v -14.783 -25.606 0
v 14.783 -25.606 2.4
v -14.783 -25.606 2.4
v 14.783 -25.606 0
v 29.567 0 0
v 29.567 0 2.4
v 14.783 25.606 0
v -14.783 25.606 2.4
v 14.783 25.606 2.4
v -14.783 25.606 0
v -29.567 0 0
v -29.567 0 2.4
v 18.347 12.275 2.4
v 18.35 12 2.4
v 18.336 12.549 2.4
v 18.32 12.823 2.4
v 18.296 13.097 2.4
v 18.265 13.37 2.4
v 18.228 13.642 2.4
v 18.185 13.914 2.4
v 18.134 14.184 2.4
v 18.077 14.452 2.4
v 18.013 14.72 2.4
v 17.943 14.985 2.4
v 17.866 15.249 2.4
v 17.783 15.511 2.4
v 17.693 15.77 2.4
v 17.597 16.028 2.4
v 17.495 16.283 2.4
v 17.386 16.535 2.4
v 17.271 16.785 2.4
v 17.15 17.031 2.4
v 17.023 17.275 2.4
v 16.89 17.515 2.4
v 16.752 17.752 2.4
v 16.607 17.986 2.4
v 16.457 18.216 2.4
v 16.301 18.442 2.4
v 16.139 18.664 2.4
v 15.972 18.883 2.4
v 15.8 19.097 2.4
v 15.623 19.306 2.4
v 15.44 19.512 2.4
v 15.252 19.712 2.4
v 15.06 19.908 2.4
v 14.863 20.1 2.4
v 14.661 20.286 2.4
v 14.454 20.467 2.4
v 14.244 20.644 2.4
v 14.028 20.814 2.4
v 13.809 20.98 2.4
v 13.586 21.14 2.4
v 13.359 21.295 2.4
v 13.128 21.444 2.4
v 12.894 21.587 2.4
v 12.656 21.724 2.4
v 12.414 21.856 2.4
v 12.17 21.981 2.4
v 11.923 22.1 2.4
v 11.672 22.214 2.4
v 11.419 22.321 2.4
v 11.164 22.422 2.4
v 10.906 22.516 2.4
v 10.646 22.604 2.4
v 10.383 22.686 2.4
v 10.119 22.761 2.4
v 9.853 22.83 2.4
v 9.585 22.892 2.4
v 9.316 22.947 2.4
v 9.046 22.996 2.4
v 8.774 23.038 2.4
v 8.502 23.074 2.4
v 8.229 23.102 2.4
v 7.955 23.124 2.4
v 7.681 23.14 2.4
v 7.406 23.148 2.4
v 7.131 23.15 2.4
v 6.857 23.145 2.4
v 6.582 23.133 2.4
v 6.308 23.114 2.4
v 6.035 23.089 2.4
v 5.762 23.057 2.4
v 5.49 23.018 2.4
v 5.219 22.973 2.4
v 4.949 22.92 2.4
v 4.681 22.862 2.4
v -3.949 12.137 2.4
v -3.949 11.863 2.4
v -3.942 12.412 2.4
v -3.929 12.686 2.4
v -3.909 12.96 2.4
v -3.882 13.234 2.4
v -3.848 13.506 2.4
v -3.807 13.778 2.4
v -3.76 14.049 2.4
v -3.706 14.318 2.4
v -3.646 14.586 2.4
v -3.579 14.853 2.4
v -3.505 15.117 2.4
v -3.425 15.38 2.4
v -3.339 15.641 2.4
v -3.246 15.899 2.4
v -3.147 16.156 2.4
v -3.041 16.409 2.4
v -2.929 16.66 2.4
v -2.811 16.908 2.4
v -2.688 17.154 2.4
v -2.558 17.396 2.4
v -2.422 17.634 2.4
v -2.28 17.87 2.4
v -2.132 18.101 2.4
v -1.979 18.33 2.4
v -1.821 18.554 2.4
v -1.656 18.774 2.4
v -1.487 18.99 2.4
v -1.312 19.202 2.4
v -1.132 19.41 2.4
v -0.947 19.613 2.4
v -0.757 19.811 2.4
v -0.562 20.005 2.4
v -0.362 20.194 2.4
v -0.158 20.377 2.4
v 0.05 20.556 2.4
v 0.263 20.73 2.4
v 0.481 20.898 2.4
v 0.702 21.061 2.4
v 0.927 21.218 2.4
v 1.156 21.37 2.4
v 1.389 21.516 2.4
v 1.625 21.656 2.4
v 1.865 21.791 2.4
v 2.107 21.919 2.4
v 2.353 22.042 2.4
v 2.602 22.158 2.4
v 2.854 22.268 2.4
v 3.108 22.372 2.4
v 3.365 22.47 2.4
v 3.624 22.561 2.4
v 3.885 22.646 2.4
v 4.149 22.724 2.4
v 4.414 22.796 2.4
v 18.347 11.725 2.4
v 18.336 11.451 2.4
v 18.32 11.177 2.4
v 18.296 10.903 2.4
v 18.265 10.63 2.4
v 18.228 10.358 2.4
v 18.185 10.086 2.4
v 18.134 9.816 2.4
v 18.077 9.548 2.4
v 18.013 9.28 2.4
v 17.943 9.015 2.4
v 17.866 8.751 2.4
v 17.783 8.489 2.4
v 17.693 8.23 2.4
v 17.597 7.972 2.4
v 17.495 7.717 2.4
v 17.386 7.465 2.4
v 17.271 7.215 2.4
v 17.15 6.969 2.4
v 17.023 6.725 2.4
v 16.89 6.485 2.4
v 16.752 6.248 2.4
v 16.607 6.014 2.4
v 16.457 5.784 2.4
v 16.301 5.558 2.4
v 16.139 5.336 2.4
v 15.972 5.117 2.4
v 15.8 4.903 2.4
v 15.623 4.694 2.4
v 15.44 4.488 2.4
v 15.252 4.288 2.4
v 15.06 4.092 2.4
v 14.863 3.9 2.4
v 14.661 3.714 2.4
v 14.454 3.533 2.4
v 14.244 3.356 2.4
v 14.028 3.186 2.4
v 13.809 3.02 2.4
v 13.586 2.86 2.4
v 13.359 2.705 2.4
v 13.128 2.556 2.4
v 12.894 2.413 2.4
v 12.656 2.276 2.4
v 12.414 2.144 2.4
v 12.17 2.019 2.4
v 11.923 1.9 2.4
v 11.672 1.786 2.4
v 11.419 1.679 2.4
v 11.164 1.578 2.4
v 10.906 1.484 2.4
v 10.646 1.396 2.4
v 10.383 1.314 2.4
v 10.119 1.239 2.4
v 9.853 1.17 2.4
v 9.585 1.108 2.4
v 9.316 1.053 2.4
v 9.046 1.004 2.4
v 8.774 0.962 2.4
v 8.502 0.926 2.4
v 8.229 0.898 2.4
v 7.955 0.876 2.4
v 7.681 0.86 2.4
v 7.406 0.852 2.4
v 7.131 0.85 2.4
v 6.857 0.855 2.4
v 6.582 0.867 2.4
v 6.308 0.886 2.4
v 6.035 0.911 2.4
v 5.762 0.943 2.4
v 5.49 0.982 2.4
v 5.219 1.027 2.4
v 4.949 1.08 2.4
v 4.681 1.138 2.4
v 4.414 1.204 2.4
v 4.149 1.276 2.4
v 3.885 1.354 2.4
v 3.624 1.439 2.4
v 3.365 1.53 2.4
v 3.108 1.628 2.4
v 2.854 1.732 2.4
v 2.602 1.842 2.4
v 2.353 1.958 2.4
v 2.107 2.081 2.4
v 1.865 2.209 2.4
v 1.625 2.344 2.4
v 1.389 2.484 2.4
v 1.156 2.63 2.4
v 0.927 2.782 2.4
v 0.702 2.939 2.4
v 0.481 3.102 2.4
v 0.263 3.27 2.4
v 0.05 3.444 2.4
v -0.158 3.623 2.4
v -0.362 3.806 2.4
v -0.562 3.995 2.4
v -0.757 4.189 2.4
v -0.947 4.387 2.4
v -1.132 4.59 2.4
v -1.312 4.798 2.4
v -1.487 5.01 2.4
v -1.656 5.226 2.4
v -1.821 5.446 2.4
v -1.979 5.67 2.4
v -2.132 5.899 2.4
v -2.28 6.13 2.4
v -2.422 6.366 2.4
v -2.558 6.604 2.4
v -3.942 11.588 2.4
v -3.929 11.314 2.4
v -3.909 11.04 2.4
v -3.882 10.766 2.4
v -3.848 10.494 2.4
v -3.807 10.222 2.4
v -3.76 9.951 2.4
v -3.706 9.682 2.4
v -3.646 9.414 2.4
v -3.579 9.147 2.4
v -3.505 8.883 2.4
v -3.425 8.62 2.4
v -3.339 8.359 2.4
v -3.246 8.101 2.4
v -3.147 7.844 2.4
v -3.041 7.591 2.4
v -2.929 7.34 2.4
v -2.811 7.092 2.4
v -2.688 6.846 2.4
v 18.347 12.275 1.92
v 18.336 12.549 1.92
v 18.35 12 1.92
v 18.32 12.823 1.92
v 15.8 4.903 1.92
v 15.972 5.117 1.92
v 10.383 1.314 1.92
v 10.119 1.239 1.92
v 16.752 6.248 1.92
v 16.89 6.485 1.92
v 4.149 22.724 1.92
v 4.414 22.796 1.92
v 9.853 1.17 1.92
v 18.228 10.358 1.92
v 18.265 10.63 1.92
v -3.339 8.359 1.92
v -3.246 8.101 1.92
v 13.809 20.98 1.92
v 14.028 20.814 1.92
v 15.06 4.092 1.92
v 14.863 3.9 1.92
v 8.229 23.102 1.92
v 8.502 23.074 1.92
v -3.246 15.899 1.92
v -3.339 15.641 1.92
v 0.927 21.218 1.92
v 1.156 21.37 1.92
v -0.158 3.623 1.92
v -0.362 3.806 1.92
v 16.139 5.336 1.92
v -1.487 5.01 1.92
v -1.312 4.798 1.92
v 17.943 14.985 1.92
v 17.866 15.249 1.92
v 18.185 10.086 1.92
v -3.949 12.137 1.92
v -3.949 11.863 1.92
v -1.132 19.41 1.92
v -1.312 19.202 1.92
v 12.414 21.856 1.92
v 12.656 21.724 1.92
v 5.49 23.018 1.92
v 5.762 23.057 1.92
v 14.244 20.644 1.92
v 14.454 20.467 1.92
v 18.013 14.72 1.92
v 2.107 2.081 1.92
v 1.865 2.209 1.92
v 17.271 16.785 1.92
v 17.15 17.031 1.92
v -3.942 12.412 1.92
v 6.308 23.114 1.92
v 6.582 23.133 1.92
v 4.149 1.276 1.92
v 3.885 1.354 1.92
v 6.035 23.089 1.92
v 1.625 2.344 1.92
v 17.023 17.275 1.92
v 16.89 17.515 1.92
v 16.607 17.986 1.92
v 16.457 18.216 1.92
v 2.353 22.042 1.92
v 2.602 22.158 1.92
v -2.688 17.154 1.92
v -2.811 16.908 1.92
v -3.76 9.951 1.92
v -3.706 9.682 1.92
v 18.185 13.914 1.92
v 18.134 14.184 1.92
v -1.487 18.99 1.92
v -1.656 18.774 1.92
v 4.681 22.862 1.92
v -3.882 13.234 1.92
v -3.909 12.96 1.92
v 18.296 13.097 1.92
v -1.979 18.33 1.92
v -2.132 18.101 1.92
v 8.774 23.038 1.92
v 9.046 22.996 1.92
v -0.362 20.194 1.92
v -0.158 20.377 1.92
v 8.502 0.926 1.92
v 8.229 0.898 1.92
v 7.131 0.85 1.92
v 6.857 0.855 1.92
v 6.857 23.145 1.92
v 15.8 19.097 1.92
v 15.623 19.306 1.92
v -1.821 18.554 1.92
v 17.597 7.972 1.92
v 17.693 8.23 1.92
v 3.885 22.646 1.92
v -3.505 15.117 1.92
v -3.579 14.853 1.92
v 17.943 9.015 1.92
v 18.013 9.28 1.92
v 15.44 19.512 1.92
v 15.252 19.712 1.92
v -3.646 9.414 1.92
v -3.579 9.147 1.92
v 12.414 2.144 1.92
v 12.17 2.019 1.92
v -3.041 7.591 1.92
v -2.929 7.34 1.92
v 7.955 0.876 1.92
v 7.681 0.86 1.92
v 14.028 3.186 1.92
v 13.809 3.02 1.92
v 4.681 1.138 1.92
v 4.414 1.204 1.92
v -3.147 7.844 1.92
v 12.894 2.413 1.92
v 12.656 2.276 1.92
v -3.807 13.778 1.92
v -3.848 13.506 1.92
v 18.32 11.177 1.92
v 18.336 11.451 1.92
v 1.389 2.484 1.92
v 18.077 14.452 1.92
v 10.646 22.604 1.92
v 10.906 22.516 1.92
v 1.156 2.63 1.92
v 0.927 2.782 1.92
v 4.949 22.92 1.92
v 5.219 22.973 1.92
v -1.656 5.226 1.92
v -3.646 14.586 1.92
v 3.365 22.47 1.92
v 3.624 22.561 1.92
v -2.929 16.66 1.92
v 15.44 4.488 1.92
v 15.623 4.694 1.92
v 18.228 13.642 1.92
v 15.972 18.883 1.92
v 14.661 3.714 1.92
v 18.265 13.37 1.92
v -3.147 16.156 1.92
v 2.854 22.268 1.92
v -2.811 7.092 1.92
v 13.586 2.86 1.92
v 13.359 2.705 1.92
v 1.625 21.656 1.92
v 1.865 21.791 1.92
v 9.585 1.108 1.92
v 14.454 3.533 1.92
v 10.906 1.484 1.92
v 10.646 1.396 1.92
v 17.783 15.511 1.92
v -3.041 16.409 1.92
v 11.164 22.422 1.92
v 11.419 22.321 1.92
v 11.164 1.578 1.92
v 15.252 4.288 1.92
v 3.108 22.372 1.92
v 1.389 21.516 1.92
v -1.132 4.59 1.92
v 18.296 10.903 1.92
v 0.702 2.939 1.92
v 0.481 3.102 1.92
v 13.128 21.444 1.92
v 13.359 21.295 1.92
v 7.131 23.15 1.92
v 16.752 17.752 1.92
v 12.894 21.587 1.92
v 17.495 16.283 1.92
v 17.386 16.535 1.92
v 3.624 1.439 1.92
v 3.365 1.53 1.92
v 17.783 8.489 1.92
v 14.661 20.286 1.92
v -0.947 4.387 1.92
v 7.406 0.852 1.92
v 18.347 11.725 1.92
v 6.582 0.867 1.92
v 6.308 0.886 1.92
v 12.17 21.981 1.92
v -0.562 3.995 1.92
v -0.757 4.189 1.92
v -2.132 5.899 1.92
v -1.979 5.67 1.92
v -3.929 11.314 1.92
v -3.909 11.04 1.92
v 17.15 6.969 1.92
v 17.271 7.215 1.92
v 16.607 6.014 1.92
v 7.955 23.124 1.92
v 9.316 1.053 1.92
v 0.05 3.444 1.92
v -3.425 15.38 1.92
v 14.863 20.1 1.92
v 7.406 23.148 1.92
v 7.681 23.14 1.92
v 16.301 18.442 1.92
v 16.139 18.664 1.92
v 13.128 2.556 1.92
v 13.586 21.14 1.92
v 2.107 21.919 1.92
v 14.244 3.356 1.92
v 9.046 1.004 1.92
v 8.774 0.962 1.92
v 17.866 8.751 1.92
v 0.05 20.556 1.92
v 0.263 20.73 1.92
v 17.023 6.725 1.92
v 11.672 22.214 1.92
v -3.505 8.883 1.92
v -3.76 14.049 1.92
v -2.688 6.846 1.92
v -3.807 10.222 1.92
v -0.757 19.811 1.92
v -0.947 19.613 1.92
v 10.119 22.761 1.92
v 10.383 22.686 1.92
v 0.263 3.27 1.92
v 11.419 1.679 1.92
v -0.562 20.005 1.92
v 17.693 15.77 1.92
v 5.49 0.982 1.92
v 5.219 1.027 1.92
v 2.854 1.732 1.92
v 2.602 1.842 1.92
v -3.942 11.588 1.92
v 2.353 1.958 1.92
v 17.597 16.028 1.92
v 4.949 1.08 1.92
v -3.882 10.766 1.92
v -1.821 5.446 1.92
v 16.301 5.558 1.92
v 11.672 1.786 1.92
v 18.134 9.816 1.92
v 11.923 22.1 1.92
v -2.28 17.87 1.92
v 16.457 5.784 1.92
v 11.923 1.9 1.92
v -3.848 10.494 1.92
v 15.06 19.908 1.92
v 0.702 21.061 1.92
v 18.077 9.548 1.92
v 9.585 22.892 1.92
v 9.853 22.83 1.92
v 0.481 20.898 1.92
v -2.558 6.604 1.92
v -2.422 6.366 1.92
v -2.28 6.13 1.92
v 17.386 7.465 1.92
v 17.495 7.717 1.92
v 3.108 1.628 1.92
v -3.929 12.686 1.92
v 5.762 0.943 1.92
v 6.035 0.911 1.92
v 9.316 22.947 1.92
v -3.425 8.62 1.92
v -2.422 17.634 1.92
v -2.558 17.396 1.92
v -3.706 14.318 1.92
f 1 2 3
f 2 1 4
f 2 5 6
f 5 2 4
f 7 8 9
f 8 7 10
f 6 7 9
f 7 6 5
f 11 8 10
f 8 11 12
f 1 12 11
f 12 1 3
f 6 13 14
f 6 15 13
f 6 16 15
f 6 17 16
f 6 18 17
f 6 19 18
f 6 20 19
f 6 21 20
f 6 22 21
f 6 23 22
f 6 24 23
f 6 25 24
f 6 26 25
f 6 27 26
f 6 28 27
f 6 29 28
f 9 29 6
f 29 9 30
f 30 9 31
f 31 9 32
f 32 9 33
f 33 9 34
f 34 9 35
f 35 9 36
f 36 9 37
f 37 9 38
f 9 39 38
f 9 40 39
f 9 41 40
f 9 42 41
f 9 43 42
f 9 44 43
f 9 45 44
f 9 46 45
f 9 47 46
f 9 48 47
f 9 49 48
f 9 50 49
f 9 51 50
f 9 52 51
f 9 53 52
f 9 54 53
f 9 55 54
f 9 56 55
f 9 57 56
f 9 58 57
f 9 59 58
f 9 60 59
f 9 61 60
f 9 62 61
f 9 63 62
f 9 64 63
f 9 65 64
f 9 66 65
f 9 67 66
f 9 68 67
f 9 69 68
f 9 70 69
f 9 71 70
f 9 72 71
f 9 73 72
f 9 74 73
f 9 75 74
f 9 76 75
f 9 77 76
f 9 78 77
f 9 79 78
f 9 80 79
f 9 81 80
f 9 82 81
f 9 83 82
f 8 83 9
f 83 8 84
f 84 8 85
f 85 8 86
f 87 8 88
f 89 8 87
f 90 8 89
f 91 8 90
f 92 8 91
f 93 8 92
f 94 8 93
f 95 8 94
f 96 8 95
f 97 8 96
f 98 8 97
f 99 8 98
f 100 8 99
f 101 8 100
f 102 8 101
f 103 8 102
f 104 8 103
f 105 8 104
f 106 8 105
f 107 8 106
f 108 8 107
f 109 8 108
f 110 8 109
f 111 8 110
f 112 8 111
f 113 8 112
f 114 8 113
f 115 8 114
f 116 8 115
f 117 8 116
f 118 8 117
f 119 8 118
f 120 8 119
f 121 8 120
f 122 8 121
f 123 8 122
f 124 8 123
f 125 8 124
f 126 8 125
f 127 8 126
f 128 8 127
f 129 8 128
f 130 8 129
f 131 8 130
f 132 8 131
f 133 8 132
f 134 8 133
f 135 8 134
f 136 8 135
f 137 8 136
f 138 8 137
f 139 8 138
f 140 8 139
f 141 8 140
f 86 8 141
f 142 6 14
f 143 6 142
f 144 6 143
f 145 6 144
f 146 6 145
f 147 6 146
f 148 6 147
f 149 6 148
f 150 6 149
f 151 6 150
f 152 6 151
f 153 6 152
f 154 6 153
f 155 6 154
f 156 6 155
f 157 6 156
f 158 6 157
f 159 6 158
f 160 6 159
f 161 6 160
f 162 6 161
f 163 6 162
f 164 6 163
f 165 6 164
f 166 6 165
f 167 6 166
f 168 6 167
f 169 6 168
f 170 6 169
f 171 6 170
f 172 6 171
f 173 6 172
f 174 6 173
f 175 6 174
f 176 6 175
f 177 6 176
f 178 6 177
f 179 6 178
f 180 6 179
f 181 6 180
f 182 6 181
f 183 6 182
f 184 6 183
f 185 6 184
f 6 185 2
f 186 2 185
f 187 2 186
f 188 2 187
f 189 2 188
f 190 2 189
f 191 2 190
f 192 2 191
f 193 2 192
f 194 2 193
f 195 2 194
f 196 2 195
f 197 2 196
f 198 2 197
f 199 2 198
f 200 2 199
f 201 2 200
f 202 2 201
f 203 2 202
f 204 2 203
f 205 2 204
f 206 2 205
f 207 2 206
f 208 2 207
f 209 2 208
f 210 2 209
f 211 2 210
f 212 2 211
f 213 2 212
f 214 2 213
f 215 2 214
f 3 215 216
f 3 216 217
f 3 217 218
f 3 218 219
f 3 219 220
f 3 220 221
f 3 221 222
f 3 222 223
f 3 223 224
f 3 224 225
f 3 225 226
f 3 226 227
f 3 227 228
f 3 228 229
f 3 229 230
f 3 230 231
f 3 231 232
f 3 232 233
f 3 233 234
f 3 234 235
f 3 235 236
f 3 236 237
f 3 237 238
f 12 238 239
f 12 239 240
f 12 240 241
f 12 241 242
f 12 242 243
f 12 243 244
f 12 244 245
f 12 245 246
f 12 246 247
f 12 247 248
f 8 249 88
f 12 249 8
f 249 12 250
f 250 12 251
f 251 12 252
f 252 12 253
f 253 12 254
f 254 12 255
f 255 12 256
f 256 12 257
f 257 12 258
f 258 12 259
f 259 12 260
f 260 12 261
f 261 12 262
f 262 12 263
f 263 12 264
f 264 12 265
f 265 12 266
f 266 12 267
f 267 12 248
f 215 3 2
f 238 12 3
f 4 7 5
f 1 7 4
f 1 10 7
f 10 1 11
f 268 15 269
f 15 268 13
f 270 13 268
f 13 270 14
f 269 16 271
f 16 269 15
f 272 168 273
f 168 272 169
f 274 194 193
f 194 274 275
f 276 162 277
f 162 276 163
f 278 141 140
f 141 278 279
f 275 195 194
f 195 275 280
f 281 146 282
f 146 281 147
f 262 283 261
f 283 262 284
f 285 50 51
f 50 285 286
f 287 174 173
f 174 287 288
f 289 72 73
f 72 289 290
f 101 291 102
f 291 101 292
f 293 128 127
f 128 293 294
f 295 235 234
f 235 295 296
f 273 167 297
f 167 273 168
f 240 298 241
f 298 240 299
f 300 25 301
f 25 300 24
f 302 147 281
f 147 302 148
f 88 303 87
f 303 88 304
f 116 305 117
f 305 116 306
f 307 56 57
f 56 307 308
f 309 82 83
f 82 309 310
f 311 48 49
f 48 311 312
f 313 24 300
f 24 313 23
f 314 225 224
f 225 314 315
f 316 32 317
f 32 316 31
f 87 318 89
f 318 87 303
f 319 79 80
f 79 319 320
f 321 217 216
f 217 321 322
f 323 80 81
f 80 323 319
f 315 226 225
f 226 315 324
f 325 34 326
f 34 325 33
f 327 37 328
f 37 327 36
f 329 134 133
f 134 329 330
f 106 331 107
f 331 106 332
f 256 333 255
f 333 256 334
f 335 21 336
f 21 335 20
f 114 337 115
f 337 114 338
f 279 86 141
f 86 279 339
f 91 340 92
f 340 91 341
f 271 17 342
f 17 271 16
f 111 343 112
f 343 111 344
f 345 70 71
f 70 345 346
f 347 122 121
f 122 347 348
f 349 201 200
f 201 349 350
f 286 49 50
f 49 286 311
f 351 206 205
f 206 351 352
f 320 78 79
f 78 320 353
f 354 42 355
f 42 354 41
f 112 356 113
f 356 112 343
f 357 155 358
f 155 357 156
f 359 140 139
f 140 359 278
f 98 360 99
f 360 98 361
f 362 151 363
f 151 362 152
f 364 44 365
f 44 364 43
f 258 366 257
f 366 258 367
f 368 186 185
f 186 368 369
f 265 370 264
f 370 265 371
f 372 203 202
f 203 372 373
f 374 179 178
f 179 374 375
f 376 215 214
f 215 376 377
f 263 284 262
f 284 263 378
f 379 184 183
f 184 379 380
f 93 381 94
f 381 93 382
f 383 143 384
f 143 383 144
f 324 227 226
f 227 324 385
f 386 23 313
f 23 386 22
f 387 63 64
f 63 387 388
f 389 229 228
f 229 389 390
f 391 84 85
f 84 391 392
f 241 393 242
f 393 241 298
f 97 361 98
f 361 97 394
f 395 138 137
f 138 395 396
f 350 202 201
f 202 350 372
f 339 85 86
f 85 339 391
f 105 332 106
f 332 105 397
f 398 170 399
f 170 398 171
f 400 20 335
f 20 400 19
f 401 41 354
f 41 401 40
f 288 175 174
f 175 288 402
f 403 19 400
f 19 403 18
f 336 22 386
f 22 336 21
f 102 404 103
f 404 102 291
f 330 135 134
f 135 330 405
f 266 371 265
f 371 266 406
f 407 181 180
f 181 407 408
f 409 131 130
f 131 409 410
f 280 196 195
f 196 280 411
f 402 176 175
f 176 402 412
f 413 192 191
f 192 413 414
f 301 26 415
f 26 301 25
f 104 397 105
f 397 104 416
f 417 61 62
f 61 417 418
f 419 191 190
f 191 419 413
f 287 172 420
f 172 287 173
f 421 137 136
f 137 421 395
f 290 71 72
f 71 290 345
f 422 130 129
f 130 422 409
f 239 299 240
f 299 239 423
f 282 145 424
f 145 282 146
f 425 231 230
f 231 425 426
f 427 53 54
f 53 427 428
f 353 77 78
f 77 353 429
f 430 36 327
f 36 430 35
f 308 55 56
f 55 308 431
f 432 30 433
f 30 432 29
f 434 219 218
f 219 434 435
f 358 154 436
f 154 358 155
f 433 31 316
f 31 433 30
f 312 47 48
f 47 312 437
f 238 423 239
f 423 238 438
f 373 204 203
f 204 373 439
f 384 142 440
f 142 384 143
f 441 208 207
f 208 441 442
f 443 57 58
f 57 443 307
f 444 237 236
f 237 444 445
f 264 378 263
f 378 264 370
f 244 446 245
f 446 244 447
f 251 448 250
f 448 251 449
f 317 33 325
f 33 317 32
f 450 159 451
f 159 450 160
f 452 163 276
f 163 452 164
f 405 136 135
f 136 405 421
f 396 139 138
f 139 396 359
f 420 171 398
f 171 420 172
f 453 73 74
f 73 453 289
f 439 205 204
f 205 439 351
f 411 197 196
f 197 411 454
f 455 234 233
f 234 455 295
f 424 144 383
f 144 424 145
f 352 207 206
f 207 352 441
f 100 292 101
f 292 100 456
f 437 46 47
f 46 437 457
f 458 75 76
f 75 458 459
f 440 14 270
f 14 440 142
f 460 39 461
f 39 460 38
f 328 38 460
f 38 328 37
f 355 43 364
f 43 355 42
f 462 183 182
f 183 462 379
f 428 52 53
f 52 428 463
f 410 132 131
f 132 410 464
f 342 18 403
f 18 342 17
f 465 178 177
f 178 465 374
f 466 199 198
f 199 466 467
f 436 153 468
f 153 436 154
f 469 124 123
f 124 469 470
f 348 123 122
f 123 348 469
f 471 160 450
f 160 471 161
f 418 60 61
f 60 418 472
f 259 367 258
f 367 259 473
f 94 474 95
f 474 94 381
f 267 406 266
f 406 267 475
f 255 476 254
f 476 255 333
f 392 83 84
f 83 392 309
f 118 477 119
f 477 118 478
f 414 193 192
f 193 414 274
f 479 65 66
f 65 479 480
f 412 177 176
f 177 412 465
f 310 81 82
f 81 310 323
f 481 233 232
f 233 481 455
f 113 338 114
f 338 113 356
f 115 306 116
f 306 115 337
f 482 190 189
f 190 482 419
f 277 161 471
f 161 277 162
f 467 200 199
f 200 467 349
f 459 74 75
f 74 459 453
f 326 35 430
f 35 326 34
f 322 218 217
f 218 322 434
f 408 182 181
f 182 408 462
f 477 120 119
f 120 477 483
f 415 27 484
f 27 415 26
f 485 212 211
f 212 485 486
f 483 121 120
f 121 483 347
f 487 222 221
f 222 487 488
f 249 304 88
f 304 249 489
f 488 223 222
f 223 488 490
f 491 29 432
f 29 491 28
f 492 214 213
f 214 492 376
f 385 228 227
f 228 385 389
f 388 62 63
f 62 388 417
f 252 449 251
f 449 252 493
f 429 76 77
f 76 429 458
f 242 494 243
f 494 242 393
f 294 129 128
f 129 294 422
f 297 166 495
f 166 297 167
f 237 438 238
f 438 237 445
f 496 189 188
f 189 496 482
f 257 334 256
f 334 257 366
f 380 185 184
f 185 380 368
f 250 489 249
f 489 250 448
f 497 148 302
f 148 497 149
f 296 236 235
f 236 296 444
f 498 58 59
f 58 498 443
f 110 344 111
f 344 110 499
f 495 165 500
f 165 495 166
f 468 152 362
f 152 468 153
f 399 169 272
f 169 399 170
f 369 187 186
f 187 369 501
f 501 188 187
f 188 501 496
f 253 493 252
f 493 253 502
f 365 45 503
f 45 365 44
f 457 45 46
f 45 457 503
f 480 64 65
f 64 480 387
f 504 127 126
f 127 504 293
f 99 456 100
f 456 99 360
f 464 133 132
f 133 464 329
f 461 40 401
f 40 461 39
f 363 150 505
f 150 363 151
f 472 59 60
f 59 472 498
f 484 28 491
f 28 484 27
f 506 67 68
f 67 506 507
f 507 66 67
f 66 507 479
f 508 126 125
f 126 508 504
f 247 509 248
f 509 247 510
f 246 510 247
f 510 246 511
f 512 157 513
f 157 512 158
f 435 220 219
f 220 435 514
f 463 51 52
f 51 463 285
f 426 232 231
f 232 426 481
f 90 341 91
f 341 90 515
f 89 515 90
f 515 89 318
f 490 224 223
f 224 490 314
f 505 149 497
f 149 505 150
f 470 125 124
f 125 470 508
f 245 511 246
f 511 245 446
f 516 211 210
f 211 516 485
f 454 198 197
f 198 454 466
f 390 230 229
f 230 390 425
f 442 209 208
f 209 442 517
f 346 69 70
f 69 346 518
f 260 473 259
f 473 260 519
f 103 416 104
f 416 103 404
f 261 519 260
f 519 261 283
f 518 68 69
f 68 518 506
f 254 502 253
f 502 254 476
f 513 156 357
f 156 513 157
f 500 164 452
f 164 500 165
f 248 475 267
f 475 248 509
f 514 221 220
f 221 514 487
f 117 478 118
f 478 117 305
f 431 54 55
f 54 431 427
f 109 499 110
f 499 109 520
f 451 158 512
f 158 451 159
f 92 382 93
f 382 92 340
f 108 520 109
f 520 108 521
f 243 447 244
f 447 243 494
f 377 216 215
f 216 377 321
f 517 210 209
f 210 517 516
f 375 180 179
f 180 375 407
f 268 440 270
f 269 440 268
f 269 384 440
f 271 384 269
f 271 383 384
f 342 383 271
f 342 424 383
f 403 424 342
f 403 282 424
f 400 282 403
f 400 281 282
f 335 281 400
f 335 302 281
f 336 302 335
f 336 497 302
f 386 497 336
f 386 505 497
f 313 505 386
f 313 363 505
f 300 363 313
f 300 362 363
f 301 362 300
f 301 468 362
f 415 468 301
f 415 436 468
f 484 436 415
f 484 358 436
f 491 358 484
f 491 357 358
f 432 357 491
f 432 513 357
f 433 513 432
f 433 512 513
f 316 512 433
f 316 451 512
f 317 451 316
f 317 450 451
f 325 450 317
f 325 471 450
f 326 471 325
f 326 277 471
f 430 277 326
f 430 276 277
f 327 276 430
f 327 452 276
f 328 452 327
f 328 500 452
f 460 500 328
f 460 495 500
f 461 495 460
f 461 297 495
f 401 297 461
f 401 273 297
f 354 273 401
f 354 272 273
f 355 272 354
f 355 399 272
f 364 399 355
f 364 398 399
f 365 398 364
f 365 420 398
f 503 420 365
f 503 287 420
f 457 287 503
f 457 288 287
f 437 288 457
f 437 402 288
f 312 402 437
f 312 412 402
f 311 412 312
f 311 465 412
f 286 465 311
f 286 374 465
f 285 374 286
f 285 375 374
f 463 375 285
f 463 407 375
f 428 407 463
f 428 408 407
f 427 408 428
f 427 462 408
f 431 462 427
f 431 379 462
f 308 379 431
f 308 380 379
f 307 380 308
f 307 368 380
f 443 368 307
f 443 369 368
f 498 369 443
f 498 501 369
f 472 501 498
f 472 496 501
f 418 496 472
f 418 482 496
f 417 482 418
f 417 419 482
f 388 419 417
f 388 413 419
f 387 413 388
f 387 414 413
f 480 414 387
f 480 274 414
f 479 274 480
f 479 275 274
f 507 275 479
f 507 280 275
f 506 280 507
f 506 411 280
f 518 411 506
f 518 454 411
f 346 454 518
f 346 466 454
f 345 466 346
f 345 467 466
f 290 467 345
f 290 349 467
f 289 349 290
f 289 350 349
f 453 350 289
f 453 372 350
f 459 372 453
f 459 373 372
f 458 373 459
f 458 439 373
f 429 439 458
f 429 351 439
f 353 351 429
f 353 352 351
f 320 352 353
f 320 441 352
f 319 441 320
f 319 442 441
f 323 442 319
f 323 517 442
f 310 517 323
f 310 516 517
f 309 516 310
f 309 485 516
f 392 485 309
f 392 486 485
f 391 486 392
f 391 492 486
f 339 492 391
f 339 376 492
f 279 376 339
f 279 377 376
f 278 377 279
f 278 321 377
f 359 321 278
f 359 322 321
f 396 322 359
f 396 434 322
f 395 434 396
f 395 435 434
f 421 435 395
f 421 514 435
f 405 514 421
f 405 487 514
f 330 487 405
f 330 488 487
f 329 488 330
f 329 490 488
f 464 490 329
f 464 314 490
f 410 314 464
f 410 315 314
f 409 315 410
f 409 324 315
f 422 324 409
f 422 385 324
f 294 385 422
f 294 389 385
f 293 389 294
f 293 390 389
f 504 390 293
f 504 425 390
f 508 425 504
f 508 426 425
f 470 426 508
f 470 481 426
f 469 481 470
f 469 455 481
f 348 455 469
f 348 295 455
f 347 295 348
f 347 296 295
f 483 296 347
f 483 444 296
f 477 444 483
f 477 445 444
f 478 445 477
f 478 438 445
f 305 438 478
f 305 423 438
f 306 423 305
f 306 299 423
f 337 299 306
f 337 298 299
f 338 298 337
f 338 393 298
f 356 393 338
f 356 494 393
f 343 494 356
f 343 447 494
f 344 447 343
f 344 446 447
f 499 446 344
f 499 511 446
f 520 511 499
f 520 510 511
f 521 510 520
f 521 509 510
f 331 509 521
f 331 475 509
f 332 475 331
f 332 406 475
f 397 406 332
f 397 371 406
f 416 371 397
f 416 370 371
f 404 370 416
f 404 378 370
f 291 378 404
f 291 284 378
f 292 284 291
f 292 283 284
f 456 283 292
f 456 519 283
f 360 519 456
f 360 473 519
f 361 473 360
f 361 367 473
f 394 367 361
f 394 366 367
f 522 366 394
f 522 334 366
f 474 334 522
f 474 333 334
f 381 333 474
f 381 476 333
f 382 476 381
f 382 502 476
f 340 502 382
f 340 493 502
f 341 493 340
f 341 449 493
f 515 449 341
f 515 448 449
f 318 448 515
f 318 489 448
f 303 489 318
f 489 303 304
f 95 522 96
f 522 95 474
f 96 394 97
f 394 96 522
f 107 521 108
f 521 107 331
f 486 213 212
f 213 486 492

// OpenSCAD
INNER_RADIUS = 29.567;


// scale([0.8, 0.8, 0.8]) 
//   import("C:/Users/AlexT/Desktop/3D Printing/CATAN/catan-style boardgame 2.0 (magnetic & multicolor) - 2525047/files/desert.stl");




difference() {
  cylinder(r=INNER_RADIUS, h=2.4, $fn=6);

  translate([7.2, 12, 1.92])
    cylinder(r=11.15, h=10, $fn=255); 

}


    
